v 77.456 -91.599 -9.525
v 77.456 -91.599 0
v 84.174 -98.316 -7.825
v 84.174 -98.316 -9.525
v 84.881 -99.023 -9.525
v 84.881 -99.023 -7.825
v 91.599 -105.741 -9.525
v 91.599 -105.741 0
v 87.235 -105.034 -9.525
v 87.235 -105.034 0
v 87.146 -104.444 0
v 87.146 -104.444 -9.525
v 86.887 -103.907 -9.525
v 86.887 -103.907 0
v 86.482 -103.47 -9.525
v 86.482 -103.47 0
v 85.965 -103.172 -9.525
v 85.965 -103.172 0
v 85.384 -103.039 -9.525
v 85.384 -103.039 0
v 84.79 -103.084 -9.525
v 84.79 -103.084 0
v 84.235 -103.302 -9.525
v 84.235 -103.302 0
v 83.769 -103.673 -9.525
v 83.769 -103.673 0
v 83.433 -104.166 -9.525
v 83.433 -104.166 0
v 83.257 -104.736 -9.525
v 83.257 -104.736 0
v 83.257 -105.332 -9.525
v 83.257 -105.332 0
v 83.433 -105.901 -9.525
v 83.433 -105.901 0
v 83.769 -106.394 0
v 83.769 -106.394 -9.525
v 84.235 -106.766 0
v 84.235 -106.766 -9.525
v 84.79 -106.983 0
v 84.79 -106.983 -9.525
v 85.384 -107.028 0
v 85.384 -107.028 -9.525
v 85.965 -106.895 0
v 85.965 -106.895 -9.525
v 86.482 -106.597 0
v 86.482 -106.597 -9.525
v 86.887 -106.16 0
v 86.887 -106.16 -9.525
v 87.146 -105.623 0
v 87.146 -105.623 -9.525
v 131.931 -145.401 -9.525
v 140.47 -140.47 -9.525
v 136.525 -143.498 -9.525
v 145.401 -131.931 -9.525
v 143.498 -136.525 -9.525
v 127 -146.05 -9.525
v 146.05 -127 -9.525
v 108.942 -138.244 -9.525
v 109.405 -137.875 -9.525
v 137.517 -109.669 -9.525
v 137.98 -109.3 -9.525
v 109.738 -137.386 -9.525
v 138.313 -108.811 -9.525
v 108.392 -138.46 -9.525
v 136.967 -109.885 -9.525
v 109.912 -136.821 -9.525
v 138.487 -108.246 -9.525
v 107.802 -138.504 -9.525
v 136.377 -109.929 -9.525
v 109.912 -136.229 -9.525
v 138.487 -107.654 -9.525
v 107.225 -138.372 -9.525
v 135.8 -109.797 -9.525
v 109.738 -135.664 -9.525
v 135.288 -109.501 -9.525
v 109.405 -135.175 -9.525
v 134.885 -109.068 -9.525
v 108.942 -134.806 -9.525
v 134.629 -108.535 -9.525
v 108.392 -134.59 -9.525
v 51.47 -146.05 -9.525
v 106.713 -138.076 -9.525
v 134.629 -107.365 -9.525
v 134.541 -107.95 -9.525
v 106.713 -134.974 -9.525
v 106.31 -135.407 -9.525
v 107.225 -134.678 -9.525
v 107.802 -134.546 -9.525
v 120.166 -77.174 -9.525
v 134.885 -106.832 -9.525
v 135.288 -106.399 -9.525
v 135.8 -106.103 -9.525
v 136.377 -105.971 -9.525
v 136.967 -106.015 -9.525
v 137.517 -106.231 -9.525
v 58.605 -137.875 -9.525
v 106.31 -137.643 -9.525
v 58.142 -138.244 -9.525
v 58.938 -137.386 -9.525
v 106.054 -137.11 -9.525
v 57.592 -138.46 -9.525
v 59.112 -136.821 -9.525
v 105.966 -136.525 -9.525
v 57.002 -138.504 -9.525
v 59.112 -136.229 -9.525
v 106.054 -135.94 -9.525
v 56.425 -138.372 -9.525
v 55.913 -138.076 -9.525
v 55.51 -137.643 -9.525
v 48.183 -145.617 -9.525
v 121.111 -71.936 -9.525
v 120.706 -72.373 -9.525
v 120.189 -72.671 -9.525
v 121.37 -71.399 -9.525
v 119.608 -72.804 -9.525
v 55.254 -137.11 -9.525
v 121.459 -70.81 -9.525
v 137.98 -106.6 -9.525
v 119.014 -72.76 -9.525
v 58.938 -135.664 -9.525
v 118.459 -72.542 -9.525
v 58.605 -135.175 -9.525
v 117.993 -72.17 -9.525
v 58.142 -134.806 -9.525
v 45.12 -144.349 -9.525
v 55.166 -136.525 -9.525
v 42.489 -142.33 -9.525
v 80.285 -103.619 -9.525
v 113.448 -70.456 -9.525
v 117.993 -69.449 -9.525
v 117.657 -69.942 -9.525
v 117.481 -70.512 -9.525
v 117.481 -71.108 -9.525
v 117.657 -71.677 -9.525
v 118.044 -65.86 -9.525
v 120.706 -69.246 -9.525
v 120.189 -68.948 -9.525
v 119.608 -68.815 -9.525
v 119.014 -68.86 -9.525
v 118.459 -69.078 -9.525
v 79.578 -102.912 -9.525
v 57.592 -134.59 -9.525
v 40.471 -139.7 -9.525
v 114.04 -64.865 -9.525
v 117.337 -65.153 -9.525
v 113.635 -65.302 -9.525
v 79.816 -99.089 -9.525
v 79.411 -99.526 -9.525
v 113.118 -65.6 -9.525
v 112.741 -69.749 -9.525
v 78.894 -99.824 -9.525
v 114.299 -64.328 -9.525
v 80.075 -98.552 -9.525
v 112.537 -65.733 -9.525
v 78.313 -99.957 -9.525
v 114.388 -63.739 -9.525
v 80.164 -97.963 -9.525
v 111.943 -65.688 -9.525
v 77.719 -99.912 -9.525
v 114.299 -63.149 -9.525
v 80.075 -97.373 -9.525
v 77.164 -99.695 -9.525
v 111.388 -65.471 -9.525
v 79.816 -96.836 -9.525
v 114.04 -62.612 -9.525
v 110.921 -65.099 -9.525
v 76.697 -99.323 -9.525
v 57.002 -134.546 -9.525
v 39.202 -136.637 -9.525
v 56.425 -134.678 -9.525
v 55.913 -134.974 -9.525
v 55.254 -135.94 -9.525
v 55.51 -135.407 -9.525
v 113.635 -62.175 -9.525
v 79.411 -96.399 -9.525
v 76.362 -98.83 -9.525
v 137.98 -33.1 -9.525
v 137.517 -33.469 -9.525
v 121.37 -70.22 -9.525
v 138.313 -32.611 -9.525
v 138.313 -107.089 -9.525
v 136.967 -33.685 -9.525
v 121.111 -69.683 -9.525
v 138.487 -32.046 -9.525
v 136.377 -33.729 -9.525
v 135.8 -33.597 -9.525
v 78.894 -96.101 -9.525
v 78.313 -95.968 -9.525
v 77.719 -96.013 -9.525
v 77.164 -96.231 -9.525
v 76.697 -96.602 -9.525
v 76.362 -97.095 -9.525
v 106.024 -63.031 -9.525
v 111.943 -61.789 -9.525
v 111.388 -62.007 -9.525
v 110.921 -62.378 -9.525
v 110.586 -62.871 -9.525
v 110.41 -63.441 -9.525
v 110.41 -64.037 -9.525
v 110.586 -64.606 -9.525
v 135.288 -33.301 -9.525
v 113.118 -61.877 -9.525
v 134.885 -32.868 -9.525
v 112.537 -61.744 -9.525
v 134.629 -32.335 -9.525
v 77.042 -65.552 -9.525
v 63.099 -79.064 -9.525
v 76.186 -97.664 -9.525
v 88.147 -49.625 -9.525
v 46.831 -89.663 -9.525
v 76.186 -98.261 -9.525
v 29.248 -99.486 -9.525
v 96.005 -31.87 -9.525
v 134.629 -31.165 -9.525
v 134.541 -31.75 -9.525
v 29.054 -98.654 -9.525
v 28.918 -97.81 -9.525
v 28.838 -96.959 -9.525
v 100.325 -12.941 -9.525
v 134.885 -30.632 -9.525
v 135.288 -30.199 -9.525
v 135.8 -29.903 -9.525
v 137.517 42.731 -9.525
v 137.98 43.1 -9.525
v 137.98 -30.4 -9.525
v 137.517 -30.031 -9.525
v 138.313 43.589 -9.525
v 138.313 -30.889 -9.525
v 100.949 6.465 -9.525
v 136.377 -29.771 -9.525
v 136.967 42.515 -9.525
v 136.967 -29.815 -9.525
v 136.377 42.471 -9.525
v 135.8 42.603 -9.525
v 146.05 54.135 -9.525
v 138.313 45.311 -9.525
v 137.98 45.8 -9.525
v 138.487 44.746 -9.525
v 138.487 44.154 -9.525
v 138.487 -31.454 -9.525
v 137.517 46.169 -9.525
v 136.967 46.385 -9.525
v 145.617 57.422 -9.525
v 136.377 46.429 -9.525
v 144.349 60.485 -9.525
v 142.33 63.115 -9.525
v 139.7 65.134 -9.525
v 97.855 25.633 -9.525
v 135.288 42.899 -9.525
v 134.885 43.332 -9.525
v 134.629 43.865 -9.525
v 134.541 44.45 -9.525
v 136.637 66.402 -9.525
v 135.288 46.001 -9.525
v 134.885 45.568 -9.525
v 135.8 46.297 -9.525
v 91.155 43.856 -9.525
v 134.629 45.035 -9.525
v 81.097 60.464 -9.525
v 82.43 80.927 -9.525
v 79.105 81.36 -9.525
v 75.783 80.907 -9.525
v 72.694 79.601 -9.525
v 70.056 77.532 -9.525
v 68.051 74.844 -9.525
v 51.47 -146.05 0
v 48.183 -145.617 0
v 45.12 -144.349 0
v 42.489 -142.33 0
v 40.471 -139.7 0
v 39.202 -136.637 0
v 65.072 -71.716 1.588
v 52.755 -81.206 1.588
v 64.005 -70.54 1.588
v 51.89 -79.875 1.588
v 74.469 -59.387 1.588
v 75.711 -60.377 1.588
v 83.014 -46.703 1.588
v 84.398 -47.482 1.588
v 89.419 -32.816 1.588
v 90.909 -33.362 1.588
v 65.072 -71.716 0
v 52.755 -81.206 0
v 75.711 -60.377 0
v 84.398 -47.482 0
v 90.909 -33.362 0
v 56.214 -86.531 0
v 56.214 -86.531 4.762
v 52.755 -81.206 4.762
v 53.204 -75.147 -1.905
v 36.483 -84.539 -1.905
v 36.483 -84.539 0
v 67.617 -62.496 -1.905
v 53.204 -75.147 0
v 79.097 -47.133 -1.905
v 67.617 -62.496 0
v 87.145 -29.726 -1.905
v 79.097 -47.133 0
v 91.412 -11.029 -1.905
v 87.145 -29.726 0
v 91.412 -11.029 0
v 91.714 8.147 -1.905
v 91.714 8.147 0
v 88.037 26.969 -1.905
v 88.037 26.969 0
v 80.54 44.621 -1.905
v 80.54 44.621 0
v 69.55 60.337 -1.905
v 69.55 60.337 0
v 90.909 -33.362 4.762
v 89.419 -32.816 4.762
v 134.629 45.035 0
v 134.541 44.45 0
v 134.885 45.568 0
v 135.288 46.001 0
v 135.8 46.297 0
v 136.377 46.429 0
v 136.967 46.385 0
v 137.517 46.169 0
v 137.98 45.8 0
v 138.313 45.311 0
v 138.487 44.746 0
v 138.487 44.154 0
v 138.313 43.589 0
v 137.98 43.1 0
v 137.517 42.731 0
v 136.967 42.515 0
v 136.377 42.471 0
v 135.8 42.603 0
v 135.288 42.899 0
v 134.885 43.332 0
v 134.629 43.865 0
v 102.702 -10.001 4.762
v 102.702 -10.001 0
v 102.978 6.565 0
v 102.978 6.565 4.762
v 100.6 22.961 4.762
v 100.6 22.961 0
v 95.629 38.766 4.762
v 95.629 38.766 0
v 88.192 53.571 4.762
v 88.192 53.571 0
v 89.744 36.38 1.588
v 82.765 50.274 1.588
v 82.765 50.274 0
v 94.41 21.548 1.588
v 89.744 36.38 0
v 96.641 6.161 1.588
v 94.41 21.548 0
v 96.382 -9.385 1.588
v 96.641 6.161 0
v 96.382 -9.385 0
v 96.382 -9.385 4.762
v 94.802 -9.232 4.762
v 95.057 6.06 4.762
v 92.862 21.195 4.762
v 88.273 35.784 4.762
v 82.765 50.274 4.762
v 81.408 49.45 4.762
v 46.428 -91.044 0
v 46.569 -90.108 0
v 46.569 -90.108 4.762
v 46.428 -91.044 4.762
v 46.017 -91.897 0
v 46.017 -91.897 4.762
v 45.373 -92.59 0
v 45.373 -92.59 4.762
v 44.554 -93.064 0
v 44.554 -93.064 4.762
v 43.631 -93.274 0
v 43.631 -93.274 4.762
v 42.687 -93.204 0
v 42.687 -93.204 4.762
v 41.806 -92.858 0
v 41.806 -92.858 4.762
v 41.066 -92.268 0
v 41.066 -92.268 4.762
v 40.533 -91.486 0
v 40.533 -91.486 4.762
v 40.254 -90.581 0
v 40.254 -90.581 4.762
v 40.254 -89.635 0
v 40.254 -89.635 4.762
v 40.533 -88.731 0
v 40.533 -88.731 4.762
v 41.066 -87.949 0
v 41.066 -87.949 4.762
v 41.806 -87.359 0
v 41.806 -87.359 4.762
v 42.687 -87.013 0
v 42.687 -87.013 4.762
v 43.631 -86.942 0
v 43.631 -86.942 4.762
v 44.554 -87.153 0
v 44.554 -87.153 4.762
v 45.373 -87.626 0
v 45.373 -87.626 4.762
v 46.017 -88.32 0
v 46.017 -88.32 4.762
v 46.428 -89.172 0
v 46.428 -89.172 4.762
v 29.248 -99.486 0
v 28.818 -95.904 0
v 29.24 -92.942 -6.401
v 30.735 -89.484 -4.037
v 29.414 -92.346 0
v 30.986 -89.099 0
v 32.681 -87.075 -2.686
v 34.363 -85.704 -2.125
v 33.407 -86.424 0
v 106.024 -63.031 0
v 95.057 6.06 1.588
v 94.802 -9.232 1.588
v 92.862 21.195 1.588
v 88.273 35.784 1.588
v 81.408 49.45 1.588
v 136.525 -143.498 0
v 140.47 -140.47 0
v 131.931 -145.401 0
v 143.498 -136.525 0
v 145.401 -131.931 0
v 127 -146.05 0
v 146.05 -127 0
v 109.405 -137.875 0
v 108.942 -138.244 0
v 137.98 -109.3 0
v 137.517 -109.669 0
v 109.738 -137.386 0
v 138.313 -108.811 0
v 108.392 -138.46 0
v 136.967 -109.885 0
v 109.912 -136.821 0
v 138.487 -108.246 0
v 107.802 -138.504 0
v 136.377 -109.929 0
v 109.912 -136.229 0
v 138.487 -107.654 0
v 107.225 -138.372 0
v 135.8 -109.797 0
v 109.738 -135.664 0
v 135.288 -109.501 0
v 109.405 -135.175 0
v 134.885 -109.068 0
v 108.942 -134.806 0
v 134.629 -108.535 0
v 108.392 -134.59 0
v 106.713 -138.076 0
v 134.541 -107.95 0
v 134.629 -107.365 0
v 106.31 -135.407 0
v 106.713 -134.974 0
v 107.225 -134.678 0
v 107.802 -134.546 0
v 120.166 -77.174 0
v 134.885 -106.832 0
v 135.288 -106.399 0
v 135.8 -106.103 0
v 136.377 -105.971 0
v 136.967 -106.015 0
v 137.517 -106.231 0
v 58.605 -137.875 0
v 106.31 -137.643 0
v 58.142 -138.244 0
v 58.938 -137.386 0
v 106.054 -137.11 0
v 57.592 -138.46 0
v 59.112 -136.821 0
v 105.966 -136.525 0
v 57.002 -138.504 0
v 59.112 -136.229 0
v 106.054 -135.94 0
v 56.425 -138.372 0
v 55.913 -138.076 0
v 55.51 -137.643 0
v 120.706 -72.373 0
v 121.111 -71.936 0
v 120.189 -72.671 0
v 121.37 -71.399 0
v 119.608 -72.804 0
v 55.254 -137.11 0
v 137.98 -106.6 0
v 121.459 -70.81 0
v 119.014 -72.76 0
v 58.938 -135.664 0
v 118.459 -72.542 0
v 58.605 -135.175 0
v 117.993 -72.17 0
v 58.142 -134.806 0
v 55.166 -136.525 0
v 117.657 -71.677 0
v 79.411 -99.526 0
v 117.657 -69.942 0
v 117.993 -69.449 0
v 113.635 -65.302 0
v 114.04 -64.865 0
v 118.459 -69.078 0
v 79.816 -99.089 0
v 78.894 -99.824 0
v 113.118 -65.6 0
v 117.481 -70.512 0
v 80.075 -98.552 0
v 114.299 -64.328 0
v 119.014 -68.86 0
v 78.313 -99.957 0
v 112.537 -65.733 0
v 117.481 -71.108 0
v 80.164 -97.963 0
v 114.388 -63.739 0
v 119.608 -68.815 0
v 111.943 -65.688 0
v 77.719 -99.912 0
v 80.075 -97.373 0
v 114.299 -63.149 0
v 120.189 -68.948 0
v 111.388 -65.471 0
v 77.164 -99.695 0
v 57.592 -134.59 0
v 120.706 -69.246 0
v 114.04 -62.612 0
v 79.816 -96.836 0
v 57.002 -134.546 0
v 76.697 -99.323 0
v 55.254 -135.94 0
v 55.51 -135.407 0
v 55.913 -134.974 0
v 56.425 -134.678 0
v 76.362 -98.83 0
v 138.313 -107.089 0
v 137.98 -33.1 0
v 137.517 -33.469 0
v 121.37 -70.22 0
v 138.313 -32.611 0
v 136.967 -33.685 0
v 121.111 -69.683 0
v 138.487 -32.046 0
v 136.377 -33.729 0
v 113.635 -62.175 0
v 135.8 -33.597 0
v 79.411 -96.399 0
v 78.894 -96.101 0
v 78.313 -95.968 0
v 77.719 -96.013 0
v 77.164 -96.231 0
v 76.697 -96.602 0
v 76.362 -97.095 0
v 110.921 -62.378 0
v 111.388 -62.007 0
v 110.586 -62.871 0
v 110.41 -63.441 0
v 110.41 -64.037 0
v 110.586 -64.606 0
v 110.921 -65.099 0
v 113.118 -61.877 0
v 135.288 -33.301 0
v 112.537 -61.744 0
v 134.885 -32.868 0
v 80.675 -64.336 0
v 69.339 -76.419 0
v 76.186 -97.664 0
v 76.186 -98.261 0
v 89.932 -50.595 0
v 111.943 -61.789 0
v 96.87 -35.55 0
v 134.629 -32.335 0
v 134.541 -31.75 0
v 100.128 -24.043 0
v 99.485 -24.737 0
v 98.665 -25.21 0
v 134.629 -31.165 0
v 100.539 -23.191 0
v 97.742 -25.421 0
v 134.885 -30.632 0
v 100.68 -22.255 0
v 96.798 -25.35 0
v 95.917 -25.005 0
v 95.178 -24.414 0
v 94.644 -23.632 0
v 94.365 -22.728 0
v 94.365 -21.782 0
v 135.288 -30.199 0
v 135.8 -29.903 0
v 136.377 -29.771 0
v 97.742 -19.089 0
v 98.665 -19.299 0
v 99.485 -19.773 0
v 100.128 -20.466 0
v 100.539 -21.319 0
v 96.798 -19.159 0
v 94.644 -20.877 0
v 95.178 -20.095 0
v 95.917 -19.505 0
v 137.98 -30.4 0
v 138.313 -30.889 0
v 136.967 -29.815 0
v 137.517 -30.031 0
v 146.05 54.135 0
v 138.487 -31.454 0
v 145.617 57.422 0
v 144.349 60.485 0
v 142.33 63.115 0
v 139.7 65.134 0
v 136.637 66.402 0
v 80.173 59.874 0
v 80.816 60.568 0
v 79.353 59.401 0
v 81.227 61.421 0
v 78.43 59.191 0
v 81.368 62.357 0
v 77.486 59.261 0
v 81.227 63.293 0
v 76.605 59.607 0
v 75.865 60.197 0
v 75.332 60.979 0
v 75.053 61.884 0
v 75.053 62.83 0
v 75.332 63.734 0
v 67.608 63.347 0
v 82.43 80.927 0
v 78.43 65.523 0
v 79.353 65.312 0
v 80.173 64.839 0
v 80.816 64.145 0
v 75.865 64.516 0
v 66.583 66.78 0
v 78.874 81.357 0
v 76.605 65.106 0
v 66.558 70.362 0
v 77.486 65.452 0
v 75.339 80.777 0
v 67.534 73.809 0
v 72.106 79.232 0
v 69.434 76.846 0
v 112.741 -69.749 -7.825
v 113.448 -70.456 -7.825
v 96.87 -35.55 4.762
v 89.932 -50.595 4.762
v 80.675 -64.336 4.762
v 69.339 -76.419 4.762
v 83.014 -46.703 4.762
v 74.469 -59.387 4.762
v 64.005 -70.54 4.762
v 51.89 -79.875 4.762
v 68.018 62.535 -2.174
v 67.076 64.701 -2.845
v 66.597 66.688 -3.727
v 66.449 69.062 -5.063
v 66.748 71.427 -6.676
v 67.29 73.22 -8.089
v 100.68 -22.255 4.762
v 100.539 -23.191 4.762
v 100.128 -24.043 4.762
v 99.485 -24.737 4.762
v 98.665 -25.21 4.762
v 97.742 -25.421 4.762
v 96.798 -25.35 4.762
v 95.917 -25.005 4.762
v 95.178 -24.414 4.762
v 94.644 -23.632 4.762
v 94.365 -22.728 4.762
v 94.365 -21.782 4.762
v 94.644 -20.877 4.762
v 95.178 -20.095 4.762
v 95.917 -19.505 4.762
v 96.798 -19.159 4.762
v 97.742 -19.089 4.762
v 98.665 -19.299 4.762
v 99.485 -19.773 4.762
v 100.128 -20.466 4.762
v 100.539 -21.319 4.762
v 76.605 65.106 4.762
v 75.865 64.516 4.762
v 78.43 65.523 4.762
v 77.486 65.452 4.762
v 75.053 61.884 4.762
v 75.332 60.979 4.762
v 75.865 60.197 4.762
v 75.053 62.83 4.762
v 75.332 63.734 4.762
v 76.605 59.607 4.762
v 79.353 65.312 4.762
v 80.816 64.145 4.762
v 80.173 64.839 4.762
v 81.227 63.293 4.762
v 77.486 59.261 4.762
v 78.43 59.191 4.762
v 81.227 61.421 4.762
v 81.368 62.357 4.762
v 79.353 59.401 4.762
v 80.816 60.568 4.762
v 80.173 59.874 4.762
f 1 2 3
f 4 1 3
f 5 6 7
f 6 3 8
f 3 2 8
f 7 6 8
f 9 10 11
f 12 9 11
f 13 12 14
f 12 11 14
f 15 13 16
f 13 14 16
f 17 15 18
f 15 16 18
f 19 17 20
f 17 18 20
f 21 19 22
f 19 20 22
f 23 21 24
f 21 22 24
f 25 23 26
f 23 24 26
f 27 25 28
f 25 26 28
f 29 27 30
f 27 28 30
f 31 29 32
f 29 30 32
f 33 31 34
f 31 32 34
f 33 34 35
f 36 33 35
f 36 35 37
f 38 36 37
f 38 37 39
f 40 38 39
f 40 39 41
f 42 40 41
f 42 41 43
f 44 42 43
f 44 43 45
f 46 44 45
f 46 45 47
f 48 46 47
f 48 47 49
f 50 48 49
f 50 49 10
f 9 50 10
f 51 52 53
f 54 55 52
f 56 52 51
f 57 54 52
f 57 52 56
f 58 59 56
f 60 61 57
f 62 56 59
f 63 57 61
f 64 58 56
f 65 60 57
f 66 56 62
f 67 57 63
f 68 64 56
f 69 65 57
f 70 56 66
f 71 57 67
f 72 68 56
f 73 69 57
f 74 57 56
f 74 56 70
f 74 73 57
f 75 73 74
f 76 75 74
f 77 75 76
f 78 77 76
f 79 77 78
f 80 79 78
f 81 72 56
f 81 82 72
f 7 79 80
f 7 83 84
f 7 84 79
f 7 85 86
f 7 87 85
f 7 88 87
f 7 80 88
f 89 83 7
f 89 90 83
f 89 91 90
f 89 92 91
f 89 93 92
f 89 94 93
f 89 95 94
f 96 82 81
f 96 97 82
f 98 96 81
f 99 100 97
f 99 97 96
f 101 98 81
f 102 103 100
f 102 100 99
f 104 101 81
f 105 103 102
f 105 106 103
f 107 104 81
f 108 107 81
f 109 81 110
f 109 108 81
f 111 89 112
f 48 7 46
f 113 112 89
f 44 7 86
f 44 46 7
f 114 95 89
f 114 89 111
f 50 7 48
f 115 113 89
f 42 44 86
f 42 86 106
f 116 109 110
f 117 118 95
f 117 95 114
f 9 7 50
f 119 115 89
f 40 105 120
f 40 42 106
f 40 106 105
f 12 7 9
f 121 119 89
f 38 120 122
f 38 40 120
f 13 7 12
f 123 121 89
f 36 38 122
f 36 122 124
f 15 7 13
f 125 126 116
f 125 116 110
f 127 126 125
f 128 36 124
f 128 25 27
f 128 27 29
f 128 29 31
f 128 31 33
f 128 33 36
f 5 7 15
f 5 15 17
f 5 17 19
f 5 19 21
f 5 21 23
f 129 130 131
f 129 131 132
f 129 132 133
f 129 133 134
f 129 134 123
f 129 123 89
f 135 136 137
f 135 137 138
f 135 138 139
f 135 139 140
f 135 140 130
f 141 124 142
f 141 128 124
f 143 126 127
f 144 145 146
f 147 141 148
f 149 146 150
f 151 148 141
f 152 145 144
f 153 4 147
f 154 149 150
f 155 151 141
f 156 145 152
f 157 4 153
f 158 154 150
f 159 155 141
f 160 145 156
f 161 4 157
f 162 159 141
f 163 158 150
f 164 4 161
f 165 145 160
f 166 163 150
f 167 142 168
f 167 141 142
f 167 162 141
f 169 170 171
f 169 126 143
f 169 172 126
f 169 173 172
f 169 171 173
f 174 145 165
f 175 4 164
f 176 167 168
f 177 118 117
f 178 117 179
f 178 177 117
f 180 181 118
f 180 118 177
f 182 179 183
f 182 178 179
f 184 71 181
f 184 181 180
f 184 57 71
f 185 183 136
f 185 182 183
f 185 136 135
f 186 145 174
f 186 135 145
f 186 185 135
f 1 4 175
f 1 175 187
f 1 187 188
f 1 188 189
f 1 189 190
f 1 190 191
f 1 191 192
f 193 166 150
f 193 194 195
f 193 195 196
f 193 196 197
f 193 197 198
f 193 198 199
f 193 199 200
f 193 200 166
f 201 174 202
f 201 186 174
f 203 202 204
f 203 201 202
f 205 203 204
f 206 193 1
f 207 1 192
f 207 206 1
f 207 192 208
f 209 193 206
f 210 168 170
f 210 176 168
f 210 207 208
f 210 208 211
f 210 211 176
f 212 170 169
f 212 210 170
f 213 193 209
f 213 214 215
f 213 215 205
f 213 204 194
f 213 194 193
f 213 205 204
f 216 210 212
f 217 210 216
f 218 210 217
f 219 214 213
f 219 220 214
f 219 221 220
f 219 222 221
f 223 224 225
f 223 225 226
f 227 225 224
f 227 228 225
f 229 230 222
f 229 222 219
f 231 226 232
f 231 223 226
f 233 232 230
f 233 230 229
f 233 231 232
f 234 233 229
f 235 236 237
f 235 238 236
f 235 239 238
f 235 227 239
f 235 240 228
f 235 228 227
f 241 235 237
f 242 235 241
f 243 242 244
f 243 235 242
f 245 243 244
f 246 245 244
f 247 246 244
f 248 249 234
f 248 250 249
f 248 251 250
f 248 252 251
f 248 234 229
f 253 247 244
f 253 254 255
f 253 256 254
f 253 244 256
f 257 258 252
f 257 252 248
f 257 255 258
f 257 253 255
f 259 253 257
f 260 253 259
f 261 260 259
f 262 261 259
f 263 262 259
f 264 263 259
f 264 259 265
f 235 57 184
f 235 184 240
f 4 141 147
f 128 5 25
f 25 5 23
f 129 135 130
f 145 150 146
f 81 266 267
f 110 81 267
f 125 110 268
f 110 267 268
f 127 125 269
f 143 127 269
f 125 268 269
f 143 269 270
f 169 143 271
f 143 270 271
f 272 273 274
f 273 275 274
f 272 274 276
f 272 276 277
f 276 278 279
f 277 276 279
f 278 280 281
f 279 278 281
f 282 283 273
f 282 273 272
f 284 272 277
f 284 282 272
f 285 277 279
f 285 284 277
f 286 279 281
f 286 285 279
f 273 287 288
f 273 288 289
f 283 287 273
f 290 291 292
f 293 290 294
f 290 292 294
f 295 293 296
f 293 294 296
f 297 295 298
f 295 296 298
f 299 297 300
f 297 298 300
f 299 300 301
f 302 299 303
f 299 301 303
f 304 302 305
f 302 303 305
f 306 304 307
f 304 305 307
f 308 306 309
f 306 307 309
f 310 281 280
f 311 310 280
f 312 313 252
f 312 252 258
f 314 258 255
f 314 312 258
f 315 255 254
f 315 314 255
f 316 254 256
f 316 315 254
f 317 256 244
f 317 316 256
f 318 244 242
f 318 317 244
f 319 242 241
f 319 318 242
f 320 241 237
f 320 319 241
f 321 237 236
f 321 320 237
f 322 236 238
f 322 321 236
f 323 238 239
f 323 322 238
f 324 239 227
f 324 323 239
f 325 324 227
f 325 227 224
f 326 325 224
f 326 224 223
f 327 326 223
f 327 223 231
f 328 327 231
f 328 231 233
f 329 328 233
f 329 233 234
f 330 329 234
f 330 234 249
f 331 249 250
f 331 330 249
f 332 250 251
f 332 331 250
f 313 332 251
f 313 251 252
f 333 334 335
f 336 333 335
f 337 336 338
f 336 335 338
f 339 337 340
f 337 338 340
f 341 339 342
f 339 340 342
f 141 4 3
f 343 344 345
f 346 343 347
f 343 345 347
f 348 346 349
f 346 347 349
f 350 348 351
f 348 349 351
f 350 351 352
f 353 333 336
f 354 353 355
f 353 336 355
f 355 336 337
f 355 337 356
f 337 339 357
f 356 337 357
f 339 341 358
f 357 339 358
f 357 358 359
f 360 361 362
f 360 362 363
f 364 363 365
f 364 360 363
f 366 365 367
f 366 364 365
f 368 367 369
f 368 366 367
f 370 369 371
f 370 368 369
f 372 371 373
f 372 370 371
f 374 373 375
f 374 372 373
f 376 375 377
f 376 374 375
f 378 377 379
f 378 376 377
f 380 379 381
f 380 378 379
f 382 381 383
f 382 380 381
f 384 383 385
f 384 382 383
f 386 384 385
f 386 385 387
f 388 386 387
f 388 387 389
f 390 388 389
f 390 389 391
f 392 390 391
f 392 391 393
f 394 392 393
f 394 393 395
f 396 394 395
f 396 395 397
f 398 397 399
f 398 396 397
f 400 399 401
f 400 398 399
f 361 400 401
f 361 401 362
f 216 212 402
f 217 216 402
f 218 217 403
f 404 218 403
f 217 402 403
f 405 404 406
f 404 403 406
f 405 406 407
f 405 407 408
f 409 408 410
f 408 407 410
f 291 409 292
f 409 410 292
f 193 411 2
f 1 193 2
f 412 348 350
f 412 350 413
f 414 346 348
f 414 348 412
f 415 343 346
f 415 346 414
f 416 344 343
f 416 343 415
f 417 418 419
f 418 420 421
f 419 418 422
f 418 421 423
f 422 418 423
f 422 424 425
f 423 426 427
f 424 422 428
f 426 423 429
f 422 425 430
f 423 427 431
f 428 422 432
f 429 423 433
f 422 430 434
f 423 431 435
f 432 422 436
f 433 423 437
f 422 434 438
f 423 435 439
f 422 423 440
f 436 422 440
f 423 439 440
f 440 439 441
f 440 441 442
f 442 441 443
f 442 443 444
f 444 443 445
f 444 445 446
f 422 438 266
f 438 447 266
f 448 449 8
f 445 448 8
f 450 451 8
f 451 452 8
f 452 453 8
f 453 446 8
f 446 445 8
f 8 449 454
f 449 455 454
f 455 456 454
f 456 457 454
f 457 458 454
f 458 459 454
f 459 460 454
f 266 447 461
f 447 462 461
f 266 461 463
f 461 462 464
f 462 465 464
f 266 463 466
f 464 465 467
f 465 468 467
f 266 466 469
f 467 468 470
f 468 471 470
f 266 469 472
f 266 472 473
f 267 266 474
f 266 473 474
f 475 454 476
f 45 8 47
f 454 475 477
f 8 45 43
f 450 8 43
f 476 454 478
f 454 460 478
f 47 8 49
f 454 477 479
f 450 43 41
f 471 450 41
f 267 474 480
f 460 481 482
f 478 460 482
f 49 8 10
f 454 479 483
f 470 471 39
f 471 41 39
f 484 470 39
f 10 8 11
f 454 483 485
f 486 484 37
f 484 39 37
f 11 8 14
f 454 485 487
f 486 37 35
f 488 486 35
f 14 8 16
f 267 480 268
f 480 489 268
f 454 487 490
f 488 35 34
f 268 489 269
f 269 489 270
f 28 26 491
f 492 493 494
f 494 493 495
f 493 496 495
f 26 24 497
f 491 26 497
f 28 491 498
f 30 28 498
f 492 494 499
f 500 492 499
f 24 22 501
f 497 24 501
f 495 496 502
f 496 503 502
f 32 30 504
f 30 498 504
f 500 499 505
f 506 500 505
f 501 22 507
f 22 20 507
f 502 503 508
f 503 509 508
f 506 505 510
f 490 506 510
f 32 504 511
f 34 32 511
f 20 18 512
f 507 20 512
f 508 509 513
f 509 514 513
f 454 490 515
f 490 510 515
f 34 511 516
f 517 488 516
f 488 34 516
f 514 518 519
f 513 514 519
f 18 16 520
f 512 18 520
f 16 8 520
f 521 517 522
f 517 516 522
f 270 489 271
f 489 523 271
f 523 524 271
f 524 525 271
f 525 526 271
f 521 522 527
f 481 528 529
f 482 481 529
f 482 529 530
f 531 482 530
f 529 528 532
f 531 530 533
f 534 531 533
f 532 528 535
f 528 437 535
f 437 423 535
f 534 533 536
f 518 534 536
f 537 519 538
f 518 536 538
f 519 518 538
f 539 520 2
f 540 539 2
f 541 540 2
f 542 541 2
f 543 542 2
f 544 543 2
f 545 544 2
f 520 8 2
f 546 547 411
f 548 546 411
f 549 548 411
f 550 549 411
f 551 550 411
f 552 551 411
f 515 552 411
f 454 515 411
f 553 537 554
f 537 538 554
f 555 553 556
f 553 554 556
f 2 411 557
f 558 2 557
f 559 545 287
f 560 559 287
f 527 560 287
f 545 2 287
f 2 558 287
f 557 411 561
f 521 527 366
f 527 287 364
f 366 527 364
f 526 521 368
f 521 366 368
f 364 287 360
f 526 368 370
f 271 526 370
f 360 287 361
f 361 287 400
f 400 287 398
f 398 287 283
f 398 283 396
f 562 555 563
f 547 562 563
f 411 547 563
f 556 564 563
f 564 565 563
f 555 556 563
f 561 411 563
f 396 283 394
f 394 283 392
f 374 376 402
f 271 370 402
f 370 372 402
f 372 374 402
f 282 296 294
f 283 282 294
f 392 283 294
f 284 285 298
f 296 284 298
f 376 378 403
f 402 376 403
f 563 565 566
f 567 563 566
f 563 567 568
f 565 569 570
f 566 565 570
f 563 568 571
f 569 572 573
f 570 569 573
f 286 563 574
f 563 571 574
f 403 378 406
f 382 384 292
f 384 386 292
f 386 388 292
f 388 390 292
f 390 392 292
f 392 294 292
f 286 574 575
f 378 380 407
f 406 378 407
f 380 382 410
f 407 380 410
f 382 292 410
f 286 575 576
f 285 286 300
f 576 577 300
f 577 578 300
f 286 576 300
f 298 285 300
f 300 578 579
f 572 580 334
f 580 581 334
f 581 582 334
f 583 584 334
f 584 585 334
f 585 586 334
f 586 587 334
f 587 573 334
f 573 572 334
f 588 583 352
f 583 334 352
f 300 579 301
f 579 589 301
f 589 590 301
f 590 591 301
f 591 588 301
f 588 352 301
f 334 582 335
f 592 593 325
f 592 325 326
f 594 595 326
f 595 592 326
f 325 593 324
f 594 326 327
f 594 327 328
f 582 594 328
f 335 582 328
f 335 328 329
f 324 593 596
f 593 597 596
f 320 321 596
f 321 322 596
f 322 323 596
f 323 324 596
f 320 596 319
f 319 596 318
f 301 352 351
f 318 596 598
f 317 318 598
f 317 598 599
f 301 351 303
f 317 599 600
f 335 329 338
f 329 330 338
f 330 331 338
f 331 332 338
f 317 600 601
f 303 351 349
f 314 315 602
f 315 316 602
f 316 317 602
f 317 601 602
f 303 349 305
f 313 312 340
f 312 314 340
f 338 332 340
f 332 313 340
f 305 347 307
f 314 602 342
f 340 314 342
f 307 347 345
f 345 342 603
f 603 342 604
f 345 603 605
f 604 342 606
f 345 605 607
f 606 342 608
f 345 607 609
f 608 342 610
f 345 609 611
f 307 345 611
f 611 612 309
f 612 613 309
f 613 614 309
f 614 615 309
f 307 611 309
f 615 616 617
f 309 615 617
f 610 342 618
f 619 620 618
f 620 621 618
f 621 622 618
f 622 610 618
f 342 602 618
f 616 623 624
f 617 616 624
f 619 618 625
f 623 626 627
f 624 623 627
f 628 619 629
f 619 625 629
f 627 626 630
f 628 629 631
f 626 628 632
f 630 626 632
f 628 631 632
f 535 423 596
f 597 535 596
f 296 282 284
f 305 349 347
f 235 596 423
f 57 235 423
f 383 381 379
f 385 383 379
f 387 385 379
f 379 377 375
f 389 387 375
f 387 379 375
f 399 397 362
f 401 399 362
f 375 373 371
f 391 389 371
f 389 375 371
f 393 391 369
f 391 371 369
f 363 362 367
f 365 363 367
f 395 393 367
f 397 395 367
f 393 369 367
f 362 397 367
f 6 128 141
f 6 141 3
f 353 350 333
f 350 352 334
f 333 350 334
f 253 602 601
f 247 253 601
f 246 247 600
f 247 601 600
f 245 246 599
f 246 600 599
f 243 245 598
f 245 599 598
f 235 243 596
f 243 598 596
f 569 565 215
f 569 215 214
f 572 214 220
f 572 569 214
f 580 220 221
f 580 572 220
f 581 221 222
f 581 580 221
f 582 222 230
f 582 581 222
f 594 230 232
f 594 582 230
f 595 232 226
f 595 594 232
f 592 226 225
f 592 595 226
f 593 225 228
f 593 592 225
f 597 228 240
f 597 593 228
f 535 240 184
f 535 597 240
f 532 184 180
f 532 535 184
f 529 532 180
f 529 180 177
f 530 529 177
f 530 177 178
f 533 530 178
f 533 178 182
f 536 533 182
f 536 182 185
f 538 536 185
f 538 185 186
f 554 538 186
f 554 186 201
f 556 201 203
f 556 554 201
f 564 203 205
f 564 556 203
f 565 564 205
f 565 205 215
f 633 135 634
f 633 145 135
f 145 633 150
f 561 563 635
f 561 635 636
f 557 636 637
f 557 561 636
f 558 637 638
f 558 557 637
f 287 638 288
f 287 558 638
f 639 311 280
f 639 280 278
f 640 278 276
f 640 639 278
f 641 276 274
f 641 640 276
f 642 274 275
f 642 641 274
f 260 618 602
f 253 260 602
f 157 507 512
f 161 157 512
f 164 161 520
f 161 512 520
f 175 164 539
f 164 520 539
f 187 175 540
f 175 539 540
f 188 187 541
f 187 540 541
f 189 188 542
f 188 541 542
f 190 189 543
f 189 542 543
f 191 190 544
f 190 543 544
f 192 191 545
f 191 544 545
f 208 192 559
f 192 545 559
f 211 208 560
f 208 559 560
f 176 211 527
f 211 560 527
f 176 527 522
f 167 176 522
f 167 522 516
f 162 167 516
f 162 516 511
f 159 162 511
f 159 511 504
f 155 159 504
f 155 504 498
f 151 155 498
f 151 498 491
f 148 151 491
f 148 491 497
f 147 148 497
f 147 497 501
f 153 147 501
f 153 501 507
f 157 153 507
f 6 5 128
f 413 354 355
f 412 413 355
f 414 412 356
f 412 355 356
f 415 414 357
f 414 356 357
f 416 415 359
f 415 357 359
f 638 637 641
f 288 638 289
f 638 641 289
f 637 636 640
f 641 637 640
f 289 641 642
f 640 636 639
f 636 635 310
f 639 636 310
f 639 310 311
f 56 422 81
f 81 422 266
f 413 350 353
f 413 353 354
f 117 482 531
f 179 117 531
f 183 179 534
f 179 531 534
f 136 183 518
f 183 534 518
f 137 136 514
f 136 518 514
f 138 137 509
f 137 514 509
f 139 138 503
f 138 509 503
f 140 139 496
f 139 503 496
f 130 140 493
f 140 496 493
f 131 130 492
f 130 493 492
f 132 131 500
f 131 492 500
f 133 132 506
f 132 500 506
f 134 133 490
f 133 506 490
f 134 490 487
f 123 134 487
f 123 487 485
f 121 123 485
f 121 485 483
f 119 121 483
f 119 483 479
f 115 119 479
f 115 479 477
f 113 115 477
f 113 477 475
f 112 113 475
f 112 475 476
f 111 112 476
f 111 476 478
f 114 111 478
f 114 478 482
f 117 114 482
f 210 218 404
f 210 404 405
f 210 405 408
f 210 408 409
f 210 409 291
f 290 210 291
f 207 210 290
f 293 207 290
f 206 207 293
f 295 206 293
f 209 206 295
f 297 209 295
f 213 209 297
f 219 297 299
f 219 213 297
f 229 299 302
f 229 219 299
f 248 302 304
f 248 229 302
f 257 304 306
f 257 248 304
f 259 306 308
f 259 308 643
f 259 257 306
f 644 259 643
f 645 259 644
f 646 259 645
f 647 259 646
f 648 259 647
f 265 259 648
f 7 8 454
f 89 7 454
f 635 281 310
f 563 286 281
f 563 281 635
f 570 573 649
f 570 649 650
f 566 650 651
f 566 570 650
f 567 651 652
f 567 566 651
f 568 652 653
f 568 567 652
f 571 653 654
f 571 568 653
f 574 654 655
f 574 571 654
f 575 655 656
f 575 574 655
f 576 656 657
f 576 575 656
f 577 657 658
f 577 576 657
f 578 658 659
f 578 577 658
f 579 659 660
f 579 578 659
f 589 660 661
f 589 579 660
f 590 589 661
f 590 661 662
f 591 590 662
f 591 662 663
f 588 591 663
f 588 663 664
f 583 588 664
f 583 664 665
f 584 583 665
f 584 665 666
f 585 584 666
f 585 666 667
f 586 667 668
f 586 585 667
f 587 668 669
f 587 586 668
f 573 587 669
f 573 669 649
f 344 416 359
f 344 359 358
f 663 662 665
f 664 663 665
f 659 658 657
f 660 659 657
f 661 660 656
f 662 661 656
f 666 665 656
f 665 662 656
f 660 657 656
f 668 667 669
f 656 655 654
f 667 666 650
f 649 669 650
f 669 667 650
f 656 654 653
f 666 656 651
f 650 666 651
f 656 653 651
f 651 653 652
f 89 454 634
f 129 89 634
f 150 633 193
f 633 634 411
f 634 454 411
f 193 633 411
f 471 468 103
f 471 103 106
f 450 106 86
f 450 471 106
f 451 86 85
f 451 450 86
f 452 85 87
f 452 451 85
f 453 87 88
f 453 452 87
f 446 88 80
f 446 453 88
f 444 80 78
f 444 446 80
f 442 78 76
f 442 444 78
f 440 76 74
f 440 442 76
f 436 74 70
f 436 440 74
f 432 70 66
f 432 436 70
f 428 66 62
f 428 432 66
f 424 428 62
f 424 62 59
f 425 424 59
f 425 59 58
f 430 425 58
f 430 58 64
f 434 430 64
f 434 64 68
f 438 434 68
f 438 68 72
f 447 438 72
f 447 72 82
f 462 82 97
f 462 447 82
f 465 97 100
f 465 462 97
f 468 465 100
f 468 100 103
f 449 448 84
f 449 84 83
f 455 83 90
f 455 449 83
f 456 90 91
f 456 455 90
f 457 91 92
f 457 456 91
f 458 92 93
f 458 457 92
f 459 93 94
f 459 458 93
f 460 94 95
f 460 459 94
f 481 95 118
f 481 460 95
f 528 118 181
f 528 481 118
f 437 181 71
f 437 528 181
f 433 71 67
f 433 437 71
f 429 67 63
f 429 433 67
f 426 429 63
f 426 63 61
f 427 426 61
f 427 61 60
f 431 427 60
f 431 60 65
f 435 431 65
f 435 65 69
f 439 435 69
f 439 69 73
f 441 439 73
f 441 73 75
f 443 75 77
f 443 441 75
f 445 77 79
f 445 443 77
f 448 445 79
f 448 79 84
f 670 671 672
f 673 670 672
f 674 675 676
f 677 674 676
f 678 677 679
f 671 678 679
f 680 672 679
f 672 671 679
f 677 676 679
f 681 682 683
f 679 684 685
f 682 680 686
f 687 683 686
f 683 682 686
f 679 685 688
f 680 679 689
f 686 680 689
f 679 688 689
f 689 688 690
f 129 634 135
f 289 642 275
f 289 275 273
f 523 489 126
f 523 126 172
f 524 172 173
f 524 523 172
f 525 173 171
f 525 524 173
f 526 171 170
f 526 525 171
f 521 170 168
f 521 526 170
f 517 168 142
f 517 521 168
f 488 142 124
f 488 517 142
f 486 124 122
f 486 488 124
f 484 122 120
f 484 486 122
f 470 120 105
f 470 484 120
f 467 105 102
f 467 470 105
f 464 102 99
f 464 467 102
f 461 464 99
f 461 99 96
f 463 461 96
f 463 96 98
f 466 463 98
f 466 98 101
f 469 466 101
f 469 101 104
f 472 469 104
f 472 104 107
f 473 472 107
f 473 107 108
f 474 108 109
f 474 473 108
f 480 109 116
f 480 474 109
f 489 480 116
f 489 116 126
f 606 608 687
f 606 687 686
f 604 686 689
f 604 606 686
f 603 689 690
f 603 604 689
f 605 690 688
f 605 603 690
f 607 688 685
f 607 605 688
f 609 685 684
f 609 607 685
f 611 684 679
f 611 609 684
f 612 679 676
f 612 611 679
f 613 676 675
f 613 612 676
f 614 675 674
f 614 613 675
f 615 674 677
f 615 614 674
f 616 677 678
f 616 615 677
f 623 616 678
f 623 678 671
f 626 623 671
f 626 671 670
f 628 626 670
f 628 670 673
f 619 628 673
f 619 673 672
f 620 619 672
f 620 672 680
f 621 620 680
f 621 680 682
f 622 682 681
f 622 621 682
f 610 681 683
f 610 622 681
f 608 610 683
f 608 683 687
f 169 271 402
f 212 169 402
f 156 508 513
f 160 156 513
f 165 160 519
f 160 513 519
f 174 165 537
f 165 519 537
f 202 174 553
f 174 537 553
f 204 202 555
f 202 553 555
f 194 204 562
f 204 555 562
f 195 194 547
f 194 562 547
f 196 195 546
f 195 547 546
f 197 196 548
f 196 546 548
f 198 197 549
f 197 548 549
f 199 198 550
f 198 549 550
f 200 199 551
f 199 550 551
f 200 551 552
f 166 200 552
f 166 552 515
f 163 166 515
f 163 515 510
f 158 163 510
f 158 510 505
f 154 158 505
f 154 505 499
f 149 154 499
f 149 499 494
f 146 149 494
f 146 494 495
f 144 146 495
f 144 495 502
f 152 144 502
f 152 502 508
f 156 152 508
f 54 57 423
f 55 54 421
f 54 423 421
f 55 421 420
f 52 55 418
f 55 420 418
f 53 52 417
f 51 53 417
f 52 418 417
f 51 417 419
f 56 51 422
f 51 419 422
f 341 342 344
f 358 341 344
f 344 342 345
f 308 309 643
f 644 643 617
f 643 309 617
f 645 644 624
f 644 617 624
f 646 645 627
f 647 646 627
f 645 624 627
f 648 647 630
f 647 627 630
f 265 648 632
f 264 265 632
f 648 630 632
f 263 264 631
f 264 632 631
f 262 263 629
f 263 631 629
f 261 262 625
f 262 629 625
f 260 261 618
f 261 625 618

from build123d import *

# Parameters (mm, degrees)
SKETCH1_R             = 3.175
BOSS_EXTRUDE1_DEPTH   = 4.7625
BOSS_EXTRUDE1_2_DEPTH = 4.7625
BOSS_EXTRUDE1_3_DEPTH = 4.7625
BOSS_EXTRUDE1_4_DEPTH = 4.7625
BOSS_EXTRUDE1_5_DEPTH = 4.7625
SKETCH2_R             = 1.984375
BOSS_EXTRUDE2_DEPTH   = 9.525
BOSS_EXTRUDE3_DEPTH   = 3.175
SKETCH5_R             = 2
CUT_EXTRUDE1_DEPTH    = 207.765399971
CUT_EXTRUDE2_DEPTH    = 0.5
CHAMFER1_SIZE         = 7.62
CHAMFER1_SIZE_2       = 9.081162376


with BuildPart() as part:
    # Sketch1 → Boss-Extrude1 (new body)
    with BuildSketch(Plane.XY):
        with Locations(Location((-78.19292114, 62.356773808, 0), (0, 0, 180))):
            Circle(SKETCH1_R)
    extrude(amount=BOSS_EXTRUDE1_DEPTH)



with BuildPart() as body_2:
    # Sketch1 → Boss-Extrude1 2 (new body)
    with BuildSketch(Plane.XY):
        with Locations(Location((-97.504977817, -22.254874907, 0), (0, 0, 180))):
            Circle(SKETCH1_R)
    extrude(amount=BOSS_EXTRUDE1_2_DEPTH)


with BuildPart() as body_3:
    # Sketch1 → Boss-Extrude1 3 (new body)
    with BuildSketch(Plane.XY):
        with Locations(Location((-43.393797458, -90.108148901, 0), (0, 0, 180))):
            Circle(SKETCH1_R)
    extrude(amount=BOSS_EXTRUDE1_3_DEPTH)


with BuildPart() as body_4:
    # Sketch1 → Boss-Extrude1 4 (new body)
    with BuildSketch(Plane.XY):
        with BuildLine():
            Line((-88.191845565, 53.571060584), (-82.764655069, 50.274379933))
            ThreePointArc((-82.764655069, 50.274379933), (-94.409581696, 21.548370942), (-96.381613527, -9.385413164))
            Line((-96.381613527, -9.385413164), (-102.701719332, -10.000850093))
            ThreePointArc((-102.701719332, -10.000850093), (-100.600373938, 22.961378873), (-88.191845565, 53.571060584))
        make_face()
    extrude(amount=BOSS_EXTRUDE1_4_DEPTH)


with BuildPart() as body_5:
    # Sketch1 → Boss-Extrude1 5 (new body)
    with BuildSketch(Plane.XY):
        with BuildLine():
            Line((-90.909011383, -33.362449786), (-96.870258031, -35.550151411))
            ThreePointArc((-96.870258031, -35.550151411), (-80.675236097, -64.336353929), (-56.214495182, -86.53086552))
            Line((-56.214495182, -86.53086552), (-52.755141633, -81.20588918))
            ThreePointArc((-52.755141633, -81.20588918), (-75.710606183, -60.377193687), (-90.909011383, -33.362449786))
        make_face()
    extrude(amount=BOSS_EXTRUDE1_5_DEPTH)


with BuildPart() as part_1:
    add(part.part)

    add(body_2.part)  # Boss-Extrude2 merges body 2

    add(body_3.part)  # Boss-Extrude2 merges body 3
    # Sketch2 → Boss-Extrude2 (add)
    with BuildSketch(Plane.XY):
        with BuildLine():
            Line((-82.430084054, 80.927094637), (-136.637001873, 66.402394783))
            ThreePointArc((-136.637001873, 66.402394783), (-143.425587422, 61.866406938), (-146.05, 54.13513679))
            Line((-146.05, 54.13513679), (-146.05, -127))
            ThreePointArc((-146.05, -127), (-140.470384182, -140.470384182), (-127, -146.05))
            Line((-127, -146.05), (-51.469574148, -146.05))
            ThreePointArc((-51.469574148, -146.05), (-43.738303999, -143.425587422), (-39.202316154, -136.637001873))
            Line((-39.202316154, -136.637001873), (-29.247808511, -99.486273586))
            ThreePointArc((-29.247808511, -99.486273586), (-30.083781104, -90.666124862), (-36.482937232, -84.53875393))
            ThreePointArc((-36.482937232, -84.53875393), (-89.766487514, -20.488614994), (-69.549981311, 60.337432202))
            ThreePointArc((-69.549981311, 60.337432202), (-68.376222335, 75.395171012), (-82.430084054, 80.927094637))
        make_face()
        with Locations((-136.525, 44.45)):
            Circle(SKETCH2_R, mode=Mode.SUBTRACT)
        with Locations((-136.525, -31.75)):
            Circle(SKETCH2_R, mode=Mode.SUBTRACT)
        with Locations((-136.525, -107.95)):
            Circle(SKETCH2_R, mode=Mode.SUBTRACT)
        with Locations((-57.15, -136.525)):
            Circle(SKETCH2_R, mode=Mode.SUBTRACT)
        with Locations((-107.95, -136.525)):
            Circle(SKETCH2_R, mode=Mode.SUBTRACT)
    extrude(amount=-BOSS_EXTRUDE2_DEPTH)


    add(body_4.part)  # Boss-Extrude3 merges body 4

    add(body_5.part)  # Boss-Extrude3 merges body 5
    # Sketch3 → Boss-Extrude3 (add)
    with BuildSketch(Plane.XY.offset(4.7625)):
        with BuildLine():
            Line((-81.407857445, 49.45020977), (-88.191845565, 53.571060584))
            ThreePointArc((-88.191845565, 53.571060584), (-100.600373938, 22.961378873), (-102.701719332, -10.000850093))
            Line((-102.701719332, -10.000850093), (-94.801587075, -9.231553932))
            ThreePointArc((-94.801587075, -9.231553932), (-92.861883635, 21.195118959), (-81.407857445, 49.45020977))
        make_face()
        with BuildLine():
            Line((-96.870258031, -35.550151411), (-89.418699721, -32.815524379))
            ThreePointArc((-89.418699721, -32.815524379), (-74.469448705, -59.387403627), (-51.890303245, -79.874645095))
            Line((-51.890303245, -79.874645095), (-56.214495182, -86.53086552))
            ThreePointArc((-56.214495182, -86.53086552), (-80.675236097, -64.336353929), (-96.870258031, -35.550151411))
        make_face()
    extrude(amount=-BOSS_EXTRUDE3_DEPTH)


with BuildPart() as body_2_2:
    # Mirror2: mirrored copy
    add(part_1.part.mirror(Plane(origin=(0, 0, 0), x_dir=(0, 0, 1), z_dir=(1, 0, 0))))

    # Sketch5 → Cut-Extrude1 (cut, through all)
    with BuildSketch(Plane.XY):
        with Locations((119.458619614, -70.809673068)):
            Circle(SKETCH5_R)
        with Locations((112.387551802, -63.738605256)):
            Circle(SKETCH5_R)
        with Locations((78.163583592, -97.962573466)):
            Circle(SKETCH5_R)
        with Locations((85.234651404, -105.033641277)):
            Circle(SKETCH5_R)
        Polygon((106.023590771, -63.031498475), (77.456476811, -91.598612435), (91.598612435, -105.740748059), (120.165726395, -77.173634099), align=None)
    extrude(amount=-CUT_EXTRUDE1_DEPTH, mode=Mode.SUBTRACT)

    # Sketch6 → Cut-Extrude2 (cut, symmetric)
    with BuildSketch(Plane(origin=(91.598612435, -91.598612435, 0), x_dir=(0, 0, -1), z_dir=(0.7071067811865488, -0.7071067811865462, 0))):
        Polygon((9.525, 30.4), (9.525, 36.9), (7.825, 30.4), align=None)
        Polygon((7.825, -10), (9.525, -10), (9.525, -16.5), align=None)
    extrude(amount=CUT_EXTRUDE2_DEPTH, both=True, mode=Mode.SUBTRACT)

    # Chamfer1
    # the kernel refuses this chamfer: 9.081162376, 7.62 mm, written as the material it takes off along each edge
    with BuildSketch(Plane(origin=(0, 0, -9.525), x_dir=(0.15246082974719, -0.9883095139645264, 0), z_dir=(-0.9883095139645264, -0.15246082974719, 0))) as chamfer1_piece_1:
        Polygon((92.075, CHAMFER1_SIZE), (92.075 + CHAMFER1_SIZE_2, 0), (92.075, 0), align=None)
    revolve(axis=Axis((0, 0, -9.525), (0, 0, 1)), revolution_arc=136.746589735, mode=Mode.SUBTRACT)


solid = body_2_2.part
